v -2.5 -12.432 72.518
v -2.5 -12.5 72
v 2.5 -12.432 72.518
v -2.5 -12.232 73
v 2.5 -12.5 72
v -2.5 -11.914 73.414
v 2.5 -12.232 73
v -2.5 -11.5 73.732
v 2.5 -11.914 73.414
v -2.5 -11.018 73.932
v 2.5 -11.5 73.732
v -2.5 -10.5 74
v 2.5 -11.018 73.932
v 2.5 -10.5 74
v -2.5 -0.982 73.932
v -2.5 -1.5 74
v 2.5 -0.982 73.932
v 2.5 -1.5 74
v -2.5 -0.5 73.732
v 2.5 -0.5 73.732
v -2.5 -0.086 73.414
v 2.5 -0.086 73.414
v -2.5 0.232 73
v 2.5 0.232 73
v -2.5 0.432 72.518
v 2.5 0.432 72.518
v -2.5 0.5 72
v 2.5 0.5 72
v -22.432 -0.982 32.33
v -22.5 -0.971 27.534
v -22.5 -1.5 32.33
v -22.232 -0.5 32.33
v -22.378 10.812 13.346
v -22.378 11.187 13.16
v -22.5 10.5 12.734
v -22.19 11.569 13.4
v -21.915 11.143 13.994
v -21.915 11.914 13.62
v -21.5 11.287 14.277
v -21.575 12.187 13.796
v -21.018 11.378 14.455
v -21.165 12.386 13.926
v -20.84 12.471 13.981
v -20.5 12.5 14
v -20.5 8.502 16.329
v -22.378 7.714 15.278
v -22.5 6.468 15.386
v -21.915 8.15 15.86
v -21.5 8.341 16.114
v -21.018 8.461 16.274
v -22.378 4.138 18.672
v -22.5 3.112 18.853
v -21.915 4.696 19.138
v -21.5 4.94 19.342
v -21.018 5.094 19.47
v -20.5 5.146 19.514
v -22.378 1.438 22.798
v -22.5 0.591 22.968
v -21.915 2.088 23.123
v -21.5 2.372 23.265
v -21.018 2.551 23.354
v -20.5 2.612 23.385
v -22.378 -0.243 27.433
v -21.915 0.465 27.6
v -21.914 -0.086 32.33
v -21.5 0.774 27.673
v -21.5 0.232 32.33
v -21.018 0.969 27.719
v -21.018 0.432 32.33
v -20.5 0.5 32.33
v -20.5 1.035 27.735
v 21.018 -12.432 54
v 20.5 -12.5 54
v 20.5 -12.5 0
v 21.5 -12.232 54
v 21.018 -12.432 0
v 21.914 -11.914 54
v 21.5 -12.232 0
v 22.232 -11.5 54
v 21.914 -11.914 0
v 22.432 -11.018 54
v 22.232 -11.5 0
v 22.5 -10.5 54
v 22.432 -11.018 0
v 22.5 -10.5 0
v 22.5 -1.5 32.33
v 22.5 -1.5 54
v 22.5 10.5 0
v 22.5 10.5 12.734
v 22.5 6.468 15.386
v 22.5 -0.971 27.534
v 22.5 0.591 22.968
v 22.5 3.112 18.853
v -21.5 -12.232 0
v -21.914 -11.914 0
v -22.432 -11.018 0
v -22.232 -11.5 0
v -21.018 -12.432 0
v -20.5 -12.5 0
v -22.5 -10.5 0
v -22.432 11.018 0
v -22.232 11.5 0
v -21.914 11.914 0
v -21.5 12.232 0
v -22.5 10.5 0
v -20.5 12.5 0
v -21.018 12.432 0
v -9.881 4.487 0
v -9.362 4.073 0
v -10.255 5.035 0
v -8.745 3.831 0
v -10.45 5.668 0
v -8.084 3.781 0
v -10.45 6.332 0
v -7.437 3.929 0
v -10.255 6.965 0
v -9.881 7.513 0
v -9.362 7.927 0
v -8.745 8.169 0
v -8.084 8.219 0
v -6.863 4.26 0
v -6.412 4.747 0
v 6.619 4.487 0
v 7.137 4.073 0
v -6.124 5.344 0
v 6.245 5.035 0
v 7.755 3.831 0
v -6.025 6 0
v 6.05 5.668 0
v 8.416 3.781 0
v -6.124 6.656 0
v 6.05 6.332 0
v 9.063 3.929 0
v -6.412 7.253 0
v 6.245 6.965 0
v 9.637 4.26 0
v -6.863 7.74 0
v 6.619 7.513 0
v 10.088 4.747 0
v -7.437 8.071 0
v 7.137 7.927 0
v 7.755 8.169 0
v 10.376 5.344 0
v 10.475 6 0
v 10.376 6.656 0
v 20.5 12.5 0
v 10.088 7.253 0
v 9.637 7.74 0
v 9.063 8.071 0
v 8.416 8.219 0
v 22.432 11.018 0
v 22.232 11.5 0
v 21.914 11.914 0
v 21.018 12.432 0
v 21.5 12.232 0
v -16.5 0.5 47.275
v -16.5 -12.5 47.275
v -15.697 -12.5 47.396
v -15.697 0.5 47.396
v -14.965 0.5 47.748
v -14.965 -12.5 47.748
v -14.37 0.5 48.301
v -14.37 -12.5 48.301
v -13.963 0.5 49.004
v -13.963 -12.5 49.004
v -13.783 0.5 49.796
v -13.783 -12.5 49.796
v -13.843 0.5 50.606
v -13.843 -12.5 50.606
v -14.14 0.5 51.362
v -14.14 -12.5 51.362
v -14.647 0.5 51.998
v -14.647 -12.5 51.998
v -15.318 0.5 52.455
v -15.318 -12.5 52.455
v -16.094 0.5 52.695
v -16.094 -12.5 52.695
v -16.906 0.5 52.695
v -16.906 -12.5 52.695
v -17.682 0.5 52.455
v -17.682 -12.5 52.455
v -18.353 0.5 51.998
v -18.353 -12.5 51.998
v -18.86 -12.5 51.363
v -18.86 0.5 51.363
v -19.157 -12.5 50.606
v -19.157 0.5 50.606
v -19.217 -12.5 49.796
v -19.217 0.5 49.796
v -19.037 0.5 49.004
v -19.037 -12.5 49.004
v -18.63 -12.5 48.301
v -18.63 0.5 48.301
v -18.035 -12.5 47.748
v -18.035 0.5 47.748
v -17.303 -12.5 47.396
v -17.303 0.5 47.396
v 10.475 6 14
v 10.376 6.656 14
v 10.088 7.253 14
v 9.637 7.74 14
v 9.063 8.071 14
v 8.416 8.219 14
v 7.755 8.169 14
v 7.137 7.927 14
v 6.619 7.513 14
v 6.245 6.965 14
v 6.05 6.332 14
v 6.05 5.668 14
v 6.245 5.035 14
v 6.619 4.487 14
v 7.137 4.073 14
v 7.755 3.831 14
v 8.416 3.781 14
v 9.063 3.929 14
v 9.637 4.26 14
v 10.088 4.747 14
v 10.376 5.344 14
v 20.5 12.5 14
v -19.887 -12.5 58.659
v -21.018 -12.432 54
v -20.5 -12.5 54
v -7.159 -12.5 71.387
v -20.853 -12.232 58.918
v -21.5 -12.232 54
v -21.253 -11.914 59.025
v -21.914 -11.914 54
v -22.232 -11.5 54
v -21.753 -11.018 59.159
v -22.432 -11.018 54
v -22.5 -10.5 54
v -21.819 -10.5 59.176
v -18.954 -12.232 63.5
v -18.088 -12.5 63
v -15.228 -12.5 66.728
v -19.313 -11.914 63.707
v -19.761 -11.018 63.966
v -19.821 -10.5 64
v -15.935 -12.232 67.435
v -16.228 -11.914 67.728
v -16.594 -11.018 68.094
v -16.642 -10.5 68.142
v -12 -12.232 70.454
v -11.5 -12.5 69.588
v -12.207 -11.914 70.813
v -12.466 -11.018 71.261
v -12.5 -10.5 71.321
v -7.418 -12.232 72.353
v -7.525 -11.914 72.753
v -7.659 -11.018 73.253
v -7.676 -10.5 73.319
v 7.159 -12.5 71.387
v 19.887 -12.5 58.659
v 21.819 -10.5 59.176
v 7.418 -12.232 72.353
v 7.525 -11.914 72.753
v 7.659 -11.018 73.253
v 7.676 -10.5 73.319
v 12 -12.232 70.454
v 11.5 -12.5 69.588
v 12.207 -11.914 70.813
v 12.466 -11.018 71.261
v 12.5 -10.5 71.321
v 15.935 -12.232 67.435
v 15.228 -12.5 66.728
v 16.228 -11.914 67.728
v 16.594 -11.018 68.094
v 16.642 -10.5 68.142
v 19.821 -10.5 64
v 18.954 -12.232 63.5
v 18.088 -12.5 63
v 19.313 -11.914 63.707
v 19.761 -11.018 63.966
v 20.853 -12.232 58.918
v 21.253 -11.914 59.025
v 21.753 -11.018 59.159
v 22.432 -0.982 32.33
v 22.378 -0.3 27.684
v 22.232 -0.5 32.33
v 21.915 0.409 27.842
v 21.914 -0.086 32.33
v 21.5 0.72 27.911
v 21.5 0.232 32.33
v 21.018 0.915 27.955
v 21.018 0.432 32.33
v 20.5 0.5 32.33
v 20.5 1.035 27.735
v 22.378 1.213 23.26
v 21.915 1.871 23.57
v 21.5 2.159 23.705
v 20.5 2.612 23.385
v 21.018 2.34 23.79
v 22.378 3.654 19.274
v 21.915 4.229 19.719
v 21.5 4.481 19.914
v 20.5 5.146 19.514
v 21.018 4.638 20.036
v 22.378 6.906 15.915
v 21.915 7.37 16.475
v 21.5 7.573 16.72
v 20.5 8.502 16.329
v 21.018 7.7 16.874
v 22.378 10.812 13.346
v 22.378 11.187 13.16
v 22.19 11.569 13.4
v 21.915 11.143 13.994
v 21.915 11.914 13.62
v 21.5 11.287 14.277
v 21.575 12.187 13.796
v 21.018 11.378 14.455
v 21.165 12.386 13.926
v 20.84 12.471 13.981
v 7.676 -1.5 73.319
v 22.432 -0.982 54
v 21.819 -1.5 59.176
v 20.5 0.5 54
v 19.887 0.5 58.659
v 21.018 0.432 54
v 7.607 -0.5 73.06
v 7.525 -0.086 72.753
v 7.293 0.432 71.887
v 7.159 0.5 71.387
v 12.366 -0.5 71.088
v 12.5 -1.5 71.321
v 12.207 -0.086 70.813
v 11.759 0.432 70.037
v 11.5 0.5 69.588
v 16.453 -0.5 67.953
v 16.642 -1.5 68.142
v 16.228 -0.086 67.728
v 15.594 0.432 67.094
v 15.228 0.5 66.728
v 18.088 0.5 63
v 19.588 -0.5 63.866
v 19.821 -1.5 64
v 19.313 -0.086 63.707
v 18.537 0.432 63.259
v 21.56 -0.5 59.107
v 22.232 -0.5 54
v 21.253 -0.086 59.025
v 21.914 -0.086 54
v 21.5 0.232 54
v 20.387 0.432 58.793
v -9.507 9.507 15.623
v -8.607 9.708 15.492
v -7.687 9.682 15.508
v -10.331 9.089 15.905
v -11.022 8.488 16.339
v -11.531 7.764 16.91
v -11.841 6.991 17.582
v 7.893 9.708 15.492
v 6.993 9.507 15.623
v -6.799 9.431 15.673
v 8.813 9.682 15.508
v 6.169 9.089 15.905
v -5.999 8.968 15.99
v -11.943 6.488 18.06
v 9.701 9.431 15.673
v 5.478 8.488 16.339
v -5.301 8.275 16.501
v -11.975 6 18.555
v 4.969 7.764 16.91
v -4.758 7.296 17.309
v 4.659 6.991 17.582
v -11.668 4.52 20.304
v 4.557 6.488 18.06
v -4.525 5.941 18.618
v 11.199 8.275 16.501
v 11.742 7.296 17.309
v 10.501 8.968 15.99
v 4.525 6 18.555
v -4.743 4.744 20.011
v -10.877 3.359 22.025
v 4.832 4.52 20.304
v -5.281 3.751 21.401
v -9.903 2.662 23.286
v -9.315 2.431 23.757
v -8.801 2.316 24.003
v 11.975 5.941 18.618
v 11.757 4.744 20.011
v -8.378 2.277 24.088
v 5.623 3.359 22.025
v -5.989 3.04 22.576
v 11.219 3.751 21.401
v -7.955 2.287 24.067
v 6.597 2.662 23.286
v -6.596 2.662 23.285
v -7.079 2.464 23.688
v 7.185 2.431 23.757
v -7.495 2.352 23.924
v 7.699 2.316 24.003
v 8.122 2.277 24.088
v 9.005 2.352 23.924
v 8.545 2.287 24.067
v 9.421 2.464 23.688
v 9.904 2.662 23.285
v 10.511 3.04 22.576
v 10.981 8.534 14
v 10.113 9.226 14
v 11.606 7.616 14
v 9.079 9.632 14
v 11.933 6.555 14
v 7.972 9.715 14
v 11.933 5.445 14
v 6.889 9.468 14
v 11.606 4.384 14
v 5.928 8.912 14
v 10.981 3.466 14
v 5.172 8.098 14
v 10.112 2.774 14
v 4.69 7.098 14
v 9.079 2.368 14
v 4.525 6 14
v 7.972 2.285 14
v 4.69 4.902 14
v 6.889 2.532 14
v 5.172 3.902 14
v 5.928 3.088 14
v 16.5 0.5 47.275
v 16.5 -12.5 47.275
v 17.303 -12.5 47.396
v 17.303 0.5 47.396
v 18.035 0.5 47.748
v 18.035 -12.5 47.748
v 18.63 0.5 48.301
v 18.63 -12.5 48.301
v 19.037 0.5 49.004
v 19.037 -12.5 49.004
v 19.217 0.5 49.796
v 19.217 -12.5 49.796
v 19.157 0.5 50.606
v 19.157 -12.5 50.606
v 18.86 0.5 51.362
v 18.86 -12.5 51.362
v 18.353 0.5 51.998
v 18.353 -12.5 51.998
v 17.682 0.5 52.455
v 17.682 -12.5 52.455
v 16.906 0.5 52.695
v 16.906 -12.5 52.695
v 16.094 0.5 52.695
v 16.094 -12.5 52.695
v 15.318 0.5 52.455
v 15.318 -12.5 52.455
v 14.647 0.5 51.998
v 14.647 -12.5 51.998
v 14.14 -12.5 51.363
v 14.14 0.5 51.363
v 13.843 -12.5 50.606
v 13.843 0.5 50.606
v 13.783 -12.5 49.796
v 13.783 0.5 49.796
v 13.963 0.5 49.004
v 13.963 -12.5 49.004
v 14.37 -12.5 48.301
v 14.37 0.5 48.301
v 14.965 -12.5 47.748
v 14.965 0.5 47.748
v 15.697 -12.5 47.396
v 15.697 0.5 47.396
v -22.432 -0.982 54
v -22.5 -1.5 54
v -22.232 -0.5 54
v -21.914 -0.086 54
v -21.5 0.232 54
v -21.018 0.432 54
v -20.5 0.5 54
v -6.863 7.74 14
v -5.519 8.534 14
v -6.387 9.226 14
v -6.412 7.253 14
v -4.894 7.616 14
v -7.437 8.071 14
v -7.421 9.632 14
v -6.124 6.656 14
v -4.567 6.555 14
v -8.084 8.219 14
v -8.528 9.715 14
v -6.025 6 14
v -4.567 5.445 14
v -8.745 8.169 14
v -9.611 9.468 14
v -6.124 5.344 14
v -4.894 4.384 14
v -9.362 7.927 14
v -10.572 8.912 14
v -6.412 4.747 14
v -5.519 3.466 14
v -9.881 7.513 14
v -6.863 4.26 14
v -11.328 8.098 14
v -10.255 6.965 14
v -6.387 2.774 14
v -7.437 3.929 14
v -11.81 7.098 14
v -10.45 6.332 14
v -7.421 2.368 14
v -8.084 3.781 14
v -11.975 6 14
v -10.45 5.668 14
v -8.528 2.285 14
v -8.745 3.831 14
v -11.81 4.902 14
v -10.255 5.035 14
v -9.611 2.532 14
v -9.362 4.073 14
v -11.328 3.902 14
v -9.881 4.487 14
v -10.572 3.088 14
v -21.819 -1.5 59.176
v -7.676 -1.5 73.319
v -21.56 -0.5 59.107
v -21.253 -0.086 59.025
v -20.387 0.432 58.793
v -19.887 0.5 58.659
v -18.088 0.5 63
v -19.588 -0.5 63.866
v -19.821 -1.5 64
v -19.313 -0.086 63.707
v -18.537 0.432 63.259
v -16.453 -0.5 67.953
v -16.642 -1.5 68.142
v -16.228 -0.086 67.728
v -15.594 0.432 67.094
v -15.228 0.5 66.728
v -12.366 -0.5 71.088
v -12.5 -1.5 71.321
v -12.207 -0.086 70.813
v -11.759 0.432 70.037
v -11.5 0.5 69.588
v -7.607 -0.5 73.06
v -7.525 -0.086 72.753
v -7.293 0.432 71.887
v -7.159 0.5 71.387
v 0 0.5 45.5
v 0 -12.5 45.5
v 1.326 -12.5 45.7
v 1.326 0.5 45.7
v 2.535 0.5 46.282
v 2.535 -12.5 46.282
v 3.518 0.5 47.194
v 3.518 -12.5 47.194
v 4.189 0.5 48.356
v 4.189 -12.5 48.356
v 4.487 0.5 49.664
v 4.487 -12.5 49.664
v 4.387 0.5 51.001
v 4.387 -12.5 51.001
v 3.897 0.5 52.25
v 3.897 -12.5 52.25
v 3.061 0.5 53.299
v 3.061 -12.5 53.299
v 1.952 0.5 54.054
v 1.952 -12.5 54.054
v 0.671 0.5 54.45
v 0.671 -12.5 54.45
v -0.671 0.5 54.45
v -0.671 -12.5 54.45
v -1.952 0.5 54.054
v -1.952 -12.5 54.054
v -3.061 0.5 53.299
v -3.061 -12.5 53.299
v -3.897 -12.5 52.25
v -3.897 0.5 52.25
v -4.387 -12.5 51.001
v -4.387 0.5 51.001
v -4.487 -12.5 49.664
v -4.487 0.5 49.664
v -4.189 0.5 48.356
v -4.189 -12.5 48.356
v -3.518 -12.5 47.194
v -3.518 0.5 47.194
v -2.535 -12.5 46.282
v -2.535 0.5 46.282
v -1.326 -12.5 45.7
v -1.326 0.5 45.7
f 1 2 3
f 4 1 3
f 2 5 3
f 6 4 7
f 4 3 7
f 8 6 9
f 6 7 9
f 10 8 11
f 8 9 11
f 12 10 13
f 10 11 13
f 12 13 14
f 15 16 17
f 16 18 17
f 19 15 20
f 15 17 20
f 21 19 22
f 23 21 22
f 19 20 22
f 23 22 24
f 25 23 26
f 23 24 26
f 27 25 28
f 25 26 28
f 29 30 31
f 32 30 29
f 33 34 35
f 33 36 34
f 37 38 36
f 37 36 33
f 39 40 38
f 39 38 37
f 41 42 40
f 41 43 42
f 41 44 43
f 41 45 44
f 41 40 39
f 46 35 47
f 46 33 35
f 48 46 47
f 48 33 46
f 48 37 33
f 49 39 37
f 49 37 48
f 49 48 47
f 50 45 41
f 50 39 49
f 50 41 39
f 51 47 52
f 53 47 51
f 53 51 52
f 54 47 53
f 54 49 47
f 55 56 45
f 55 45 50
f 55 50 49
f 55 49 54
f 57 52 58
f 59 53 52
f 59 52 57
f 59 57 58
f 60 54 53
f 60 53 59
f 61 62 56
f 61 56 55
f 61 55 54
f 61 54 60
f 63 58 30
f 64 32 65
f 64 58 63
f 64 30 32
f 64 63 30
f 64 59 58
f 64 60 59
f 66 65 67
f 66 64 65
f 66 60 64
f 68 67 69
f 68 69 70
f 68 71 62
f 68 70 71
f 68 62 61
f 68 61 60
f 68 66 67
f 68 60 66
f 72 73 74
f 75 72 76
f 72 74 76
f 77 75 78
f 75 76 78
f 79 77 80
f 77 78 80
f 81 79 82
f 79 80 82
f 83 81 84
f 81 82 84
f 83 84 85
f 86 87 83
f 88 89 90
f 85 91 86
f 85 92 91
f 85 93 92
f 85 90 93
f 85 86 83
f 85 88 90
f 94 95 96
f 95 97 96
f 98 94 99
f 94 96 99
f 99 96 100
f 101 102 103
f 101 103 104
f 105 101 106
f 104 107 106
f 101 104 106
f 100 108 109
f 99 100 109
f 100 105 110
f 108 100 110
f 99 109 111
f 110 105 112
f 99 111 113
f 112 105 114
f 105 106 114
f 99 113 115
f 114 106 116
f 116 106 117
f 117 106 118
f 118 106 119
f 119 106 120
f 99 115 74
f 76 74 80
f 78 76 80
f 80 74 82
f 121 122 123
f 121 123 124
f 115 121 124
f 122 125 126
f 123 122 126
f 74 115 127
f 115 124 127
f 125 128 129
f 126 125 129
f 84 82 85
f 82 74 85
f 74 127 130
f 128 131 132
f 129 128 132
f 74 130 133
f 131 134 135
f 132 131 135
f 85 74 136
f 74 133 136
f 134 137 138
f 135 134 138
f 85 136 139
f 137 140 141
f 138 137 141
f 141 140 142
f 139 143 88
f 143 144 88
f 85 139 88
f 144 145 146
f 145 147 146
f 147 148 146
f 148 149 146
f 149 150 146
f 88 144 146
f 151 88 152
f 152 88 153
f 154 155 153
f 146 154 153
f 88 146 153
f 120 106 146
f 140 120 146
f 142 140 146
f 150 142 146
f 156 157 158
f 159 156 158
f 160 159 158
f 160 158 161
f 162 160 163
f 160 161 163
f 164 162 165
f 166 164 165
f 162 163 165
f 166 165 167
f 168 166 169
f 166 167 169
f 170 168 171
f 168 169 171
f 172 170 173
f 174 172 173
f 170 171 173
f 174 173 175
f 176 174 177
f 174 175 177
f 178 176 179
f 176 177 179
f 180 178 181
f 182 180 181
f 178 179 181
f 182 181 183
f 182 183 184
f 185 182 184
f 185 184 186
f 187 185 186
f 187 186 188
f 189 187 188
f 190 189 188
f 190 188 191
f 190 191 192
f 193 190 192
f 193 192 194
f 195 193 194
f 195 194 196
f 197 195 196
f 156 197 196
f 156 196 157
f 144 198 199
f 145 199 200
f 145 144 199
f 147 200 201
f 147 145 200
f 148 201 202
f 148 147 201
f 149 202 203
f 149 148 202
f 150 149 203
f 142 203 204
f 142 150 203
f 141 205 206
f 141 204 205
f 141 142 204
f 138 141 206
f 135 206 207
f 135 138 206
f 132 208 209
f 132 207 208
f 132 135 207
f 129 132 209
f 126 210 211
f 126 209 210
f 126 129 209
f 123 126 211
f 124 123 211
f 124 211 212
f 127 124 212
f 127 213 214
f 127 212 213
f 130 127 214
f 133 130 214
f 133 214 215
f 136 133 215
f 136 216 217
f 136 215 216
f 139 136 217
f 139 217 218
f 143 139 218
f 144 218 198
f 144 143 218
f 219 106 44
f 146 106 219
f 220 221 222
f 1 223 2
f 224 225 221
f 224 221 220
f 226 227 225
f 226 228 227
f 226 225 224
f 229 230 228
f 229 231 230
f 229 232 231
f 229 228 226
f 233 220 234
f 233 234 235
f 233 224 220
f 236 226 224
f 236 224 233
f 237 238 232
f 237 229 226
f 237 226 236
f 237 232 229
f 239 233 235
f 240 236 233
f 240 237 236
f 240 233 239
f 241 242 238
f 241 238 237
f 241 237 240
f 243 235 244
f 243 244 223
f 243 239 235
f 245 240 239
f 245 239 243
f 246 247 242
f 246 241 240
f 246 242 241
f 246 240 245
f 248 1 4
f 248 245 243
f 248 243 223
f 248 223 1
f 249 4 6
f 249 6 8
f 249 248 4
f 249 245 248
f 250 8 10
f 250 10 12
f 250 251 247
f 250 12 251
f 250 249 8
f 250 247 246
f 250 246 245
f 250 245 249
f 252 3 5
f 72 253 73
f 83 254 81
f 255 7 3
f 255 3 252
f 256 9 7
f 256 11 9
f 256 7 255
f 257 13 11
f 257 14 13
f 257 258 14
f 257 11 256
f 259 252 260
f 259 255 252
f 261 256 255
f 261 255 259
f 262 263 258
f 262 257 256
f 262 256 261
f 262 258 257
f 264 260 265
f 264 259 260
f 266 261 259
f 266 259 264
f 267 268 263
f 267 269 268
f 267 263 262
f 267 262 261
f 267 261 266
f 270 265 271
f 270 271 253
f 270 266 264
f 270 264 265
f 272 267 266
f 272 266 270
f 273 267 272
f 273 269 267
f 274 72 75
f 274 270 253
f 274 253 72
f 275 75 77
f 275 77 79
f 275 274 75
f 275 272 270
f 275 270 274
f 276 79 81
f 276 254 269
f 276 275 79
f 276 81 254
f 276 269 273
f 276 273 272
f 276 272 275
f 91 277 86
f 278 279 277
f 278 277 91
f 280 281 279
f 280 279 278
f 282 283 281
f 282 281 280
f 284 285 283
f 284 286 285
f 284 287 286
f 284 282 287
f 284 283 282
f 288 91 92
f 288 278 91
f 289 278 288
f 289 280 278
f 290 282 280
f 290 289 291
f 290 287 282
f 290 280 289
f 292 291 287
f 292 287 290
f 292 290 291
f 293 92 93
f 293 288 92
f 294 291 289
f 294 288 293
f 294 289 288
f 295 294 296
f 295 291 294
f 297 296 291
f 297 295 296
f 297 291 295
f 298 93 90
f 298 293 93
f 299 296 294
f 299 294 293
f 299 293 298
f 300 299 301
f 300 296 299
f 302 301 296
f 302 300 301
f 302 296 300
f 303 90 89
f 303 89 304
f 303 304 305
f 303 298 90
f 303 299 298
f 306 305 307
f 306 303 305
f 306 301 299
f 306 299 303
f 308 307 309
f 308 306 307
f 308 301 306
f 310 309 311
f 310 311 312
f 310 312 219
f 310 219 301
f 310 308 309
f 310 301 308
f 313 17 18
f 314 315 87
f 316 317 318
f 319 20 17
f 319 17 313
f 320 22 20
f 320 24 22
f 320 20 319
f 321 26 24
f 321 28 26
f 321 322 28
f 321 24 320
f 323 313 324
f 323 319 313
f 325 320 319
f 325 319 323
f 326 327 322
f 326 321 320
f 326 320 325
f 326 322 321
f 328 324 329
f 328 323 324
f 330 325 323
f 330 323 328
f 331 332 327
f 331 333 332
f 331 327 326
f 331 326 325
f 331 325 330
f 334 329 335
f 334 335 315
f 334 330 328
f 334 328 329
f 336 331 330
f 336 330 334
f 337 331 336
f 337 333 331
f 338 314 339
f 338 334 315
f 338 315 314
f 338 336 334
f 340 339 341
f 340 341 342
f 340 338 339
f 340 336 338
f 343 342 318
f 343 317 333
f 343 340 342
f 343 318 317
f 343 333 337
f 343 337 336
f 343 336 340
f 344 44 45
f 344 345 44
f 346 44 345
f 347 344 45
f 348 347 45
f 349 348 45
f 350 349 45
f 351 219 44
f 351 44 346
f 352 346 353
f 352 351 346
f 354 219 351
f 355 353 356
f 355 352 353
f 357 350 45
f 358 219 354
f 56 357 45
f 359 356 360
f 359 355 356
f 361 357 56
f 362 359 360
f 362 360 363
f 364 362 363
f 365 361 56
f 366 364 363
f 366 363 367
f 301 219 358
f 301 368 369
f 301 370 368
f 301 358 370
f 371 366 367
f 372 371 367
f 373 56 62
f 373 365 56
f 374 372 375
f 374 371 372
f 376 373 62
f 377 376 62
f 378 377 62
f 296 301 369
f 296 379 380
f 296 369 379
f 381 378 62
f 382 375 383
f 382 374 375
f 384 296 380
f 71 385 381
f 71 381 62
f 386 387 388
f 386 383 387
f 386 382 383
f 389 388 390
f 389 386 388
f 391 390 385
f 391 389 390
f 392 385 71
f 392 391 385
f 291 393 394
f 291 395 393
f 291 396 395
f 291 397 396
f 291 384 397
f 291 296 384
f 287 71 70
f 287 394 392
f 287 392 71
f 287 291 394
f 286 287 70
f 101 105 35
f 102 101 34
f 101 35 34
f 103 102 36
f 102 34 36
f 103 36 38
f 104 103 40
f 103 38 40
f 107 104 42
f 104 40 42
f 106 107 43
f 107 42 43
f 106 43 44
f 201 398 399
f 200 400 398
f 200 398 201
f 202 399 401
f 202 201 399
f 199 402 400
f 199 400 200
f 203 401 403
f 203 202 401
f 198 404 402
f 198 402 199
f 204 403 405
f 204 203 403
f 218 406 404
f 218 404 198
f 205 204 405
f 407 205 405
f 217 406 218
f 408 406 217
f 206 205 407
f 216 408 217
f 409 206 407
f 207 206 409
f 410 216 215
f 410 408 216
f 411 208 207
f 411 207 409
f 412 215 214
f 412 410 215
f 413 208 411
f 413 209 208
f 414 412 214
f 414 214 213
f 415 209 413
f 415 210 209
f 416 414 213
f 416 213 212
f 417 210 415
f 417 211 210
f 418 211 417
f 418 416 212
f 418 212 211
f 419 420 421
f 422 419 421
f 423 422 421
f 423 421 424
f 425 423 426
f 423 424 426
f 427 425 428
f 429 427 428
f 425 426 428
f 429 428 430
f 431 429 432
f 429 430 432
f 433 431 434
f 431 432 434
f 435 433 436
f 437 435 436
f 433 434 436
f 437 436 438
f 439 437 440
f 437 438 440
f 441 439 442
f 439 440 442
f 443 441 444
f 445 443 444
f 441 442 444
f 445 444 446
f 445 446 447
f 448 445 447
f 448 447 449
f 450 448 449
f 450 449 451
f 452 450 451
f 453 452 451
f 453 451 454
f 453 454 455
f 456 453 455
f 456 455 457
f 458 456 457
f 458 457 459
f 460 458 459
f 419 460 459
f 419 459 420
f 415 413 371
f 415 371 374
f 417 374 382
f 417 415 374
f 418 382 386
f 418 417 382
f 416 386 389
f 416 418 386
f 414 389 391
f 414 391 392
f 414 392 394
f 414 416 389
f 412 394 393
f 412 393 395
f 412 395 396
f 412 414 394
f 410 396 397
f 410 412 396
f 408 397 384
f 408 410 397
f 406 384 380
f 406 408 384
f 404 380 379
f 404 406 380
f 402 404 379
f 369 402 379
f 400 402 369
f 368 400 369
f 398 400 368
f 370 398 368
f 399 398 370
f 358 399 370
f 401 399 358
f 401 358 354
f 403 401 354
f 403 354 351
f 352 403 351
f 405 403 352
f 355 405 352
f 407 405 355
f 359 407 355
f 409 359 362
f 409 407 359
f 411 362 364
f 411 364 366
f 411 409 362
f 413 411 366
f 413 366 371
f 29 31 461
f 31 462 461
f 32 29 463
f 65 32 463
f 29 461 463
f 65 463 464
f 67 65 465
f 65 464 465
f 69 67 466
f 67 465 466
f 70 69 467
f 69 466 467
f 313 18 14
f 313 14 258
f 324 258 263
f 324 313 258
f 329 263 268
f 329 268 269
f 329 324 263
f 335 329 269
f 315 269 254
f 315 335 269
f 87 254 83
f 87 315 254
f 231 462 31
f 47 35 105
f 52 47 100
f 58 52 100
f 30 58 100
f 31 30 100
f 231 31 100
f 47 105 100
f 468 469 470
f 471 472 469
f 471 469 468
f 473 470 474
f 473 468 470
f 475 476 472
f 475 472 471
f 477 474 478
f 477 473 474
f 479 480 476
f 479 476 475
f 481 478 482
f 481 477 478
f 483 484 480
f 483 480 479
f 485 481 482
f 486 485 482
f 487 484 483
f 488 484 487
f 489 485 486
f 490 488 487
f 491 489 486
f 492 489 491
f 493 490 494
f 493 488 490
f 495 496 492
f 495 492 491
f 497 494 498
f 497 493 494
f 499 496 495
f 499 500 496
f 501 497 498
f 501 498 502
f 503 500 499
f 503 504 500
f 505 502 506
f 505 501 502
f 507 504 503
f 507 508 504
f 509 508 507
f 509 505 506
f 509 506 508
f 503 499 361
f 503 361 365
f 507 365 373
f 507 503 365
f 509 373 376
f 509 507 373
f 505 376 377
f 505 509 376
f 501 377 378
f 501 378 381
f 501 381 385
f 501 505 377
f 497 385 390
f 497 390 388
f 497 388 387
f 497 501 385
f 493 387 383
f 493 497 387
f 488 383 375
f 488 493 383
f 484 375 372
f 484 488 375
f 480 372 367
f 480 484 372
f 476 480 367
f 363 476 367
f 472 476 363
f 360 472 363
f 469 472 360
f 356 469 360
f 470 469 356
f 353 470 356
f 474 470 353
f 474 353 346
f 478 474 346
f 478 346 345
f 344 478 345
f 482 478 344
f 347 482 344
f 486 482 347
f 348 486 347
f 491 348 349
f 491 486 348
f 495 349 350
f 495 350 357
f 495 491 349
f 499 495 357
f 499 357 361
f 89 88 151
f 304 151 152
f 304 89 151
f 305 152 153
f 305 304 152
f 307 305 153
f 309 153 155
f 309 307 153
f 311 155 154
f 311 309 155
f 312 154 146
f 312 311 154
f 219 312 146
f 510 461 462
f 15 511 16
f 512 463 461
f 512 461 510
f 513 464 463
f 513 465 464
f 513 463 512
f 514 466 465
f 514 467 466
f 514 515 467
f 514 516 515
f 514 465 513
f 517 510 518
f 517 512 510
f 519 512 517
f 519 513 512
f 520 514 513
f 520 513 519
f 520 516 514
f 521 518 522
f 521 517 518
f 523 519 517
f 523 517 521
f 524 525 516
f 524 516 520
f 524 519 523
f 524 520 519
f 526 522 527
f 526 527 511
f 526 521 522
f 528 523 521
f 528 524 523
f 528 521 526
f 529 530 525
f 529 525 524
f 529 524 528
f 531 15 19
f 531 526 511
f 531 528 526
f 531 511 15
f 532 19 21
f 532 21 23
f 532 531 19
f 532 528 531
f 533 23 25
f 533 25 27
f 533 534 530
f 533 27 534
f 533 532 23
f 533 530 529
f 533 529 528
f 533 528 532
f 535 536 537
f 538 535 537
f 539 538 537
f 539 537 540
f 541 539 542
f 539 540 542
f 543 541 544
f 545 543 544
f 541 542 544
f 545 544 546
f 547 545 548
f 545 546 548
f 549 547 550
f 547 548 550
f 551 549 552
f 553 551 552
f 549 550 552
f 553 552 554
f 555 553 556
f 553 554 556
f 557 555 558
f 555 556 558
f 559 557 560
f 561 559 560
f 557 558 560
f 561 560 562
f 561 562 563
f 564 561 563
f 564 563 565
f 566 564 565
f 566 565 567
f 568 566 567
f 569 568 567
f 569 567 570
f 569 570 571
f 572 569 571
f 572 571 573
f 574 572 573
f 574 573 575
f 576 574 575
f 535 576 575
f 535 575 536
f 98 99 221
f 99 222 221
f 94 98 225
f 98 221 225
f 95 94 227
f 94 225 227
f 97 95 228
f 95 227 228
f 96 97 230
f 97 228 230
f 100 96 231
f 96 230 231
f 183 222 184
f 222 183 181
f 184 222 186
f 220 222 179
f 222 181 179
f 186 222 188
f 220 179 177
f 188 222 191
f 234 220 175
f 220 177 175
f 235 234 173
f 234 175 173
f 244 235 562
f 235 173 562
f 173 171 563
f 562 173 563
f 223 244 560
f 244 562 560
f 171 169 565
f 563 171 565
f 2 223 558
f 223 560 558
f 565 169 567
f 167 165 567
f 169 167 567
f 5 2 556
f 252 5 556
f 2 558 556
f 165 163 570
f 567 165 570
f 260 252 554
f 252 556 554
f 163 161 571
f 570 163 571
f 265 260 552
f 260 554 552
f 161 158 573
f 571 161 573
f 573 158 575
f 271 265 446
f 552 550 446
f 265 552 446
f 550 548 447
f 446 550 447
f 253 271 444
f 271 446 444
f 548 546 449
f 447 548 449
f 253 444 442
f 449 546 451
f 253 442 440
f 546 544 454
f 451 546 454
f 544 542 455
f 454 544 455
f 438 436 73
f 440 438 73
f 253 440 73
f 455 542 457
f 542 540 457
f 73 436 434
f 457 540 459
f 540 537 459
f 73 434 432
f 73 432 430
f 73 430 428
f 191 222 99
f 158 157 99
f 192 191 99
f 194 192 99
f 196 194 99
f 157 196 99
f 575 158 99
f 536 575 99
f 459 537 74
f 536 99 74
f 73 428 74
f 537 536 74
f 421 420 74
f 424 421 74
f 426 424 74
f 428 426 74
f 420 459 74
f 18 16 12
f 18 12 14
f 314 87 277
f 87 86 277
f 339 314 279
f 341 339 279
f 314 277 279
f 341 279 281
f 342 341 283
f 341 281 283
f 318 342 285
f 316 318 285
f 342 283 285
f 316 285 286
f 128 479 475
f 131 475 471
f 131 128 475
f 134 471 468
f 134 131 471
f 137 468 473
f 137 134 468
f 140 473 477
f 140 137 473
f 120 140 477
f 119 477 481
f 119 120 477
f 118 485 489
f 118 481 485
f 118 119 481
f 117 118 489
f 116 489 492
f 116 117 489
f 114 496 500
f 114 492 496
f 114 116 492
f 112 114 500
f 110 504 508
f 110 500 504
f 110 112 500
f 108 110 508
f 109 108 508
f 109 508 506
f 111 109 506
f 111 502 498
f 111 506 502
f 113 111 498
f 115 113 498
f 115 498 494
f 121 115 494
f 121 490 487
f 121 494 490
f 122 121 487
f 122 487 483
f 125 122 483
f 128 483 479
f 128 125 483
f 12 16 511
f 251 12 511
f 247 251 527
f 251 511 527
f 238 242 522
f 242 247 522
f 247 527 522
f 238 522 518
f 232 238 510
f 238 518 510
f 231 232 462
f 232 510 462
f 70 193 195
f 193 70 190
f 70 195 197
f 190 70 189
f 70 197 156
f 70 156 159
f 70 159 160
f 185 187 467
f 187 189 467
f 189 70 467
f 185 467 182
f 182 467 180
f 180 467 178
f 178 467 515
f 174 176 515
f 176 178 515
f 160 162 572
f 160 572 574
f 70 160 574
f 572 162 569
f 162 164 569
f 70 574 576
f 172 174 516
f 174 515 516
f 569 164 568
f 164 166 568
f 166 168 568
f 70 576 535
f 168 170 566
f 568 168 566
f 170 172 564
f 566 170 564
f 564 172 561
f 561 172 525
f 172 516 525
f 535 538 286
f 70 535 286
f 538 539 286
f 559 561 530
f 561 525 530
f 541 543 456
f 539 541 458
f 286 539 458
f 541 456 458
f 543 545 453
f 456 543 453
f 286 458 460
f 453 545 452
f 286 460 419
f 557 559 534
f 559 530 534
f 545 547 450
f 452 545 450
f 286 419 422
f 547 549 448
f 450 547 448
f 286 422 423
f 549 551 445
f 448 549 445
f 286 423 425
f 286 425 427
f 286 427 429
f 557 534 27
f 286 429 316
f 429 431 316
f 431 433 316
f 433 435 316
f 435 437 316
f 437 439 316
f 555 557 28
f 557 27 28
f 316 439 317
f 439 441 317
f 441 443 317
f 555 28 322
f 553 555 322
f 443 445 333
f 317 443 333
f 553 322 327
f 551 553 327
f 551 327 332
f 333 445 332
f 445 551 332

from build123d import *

# Parameters (mm, degrees)
SKETCH1_W           = 45
SKETCH1_H           = 25
SKETCH1_R           = 2.225
BOSS_EXTRUDE1_DEPTH = 74
SKETCH2_R           = 4.5
SKETCH2_R_2         = 2.725
CUT_EXTRUDE1_DEPTH  = 82.284992465
SKETCH3_W           = 45
SKETCH3_H           = 12
CUT_EXTRUDE2_DEPTH  = 60
FILLET4_R           = 20
SKETCH4_R           = 3.725
CUT_EXTRUDE4_DEPTH  = 27
FILLET5_R           = 20
FILLET6_R           = 2


with BuildPart() as part:
    # Sketch1 → Boss-Extrude1 (new body)
    with BuildSketch(Plane.XY):
        Rectangle(SKETCH1_W, SKETCH1_H)
        with Locations((-8.25, 6)):
            Circle(SKETCH1_R, mode=Mode.SUBTRACT)
        with Locations((8.25, 6)):
            Circle(SKETCH1_R, mode=Mode.SUBTRACT)
    extrude(amount=BOSS_EXTRUDE1_DEPTH)

    # Sketch2 → Cut-Extrude1 (cut, through all)
    with BuildSketch(Plane.XZ.offset(12.5)):
        with Locations(Location((0, 50, 0), (0, 0, 270))):
            Circle(SKETCH2_R)
        with Locations(Location((-16.5, 50, 0), (0, 0, 270))):
            Circle(SKETCH2_R_2)
        with Locations(Location((16.5, 50, 0), (0, 0, 270))):
            Circle(SKETCH2_R_2)
    extrude(amount=-CUT_EXTRUDE1_DEPTH, mode=Mode.SUBTRACT)

    # Sketch3 → Cut-Extrude2 (cut)
    with BuildSketch(Plane.XY.offset(74)):
        with Locations((0, 6.5)):
            Rectangle(SKETCH3_W, SKETCH3_H)
    extrude(amount=-CUT_EXTRUDE2_DEPTH, mode=Mode.SUBTRACT)

    # Fillet4
    # the kernel refuses this fillet: 20 mm, written as the material it adds along each edge
    with BuildSketch(Plane(origin=(22.5, 0.5, 14), x_dir=(0, 1, 0), z_dir=(-1, 0, 0))) as fillet4_piece_1_section:
        with BuildLine():
            CenterArc((20, -18.33030278), FILLET4_R, 113.578178478, 66.421821522)
            Line((0, -18.33030278), (-0.4, -18.33030278))
            Line((-0.4, -18.33030278), (-0.4, 0))
            Line((-0.4, 0), (0, 0.4))
            ThreePointArc((0, 0.4), (6, 0.4), (11.84, 0.366606056))
            Line((11.84, 0.366606056), (12, 0))
        make_face()
    fillet4_piece_1 = extrude(amount=45, mode=Mode.PRIVATE)
    fillet4_piece_1 = fillet4_piece_1 - Plane(origin=(8.25, 6, 18.573304712), x_dir=(1, 0, 0), z_dir=(0, 0, -1)) * Cylinder(2.225, 164, mode=Mode.PRIVATE)
    fillet4_piece_1 = fillet4_piece_1 - Plane(origin=(-8.25, 6, 18.573304712), x_dir=(1, 0, 0), z_dir=(0, 0, -1)) * Cylinder(2.225, 164, mode=Mode.PRIVATE)
    add(fillet4_piece_1)

    # Sketch4 → Cut-Extrude4 (cut)
    with BuildSketch(Plane.XY.offset(14)):
        with Locations(Location((-8.25, 6, 0), (0, 0, 180))):
            Circle(SKETCH4_R)
        with Locations(Location((8.25, 6, 0), (0, 0, 180))):
            Circle(SKETCH4_R)
    extrude(amount=CUT_EXTRUDE4_DEPTH, mode=Mode.SUBTRACT)

    # Fillet5
    fillet5_edges = [part.edges().sort_by_distance(p)[0] for p in [
        (-22.5, -6, 74),
        (22.5, -6, 74),
    ]]
    fillet(fillet5_edges, radius=FILLET5_R)

    # Fillet6
    fillet6_edges = [part.edges().sort_by_distance(p)[0] for p in [
        (-22.5, 12.5, 7),
        (22.5, 12.5, 7),
        (22.5, 0.5, 43.16515139),
        (-22.5, 0.5, 43.16515139),
        (22.5, 3.766799469, 21.37585163),
        (-22.5, 3.766799469, 21.37585163),
        (0, 0.5, 74),
        (0, -12.5, 74),
        (-16.642135624, 0.5, 68.142135624),
        (16.642135624, 0.5, 68.142135624),
        (22.5, -12.5, 27),
        (-22.5, -12.5, 27),
        (-16.642135624, -12.5, 68.142135624),
        (16.642135624, -12.5, 68.142135624),
    ]]
    fillet(fillet6_edges, radius=FILLET6_R)


solid = part.part
